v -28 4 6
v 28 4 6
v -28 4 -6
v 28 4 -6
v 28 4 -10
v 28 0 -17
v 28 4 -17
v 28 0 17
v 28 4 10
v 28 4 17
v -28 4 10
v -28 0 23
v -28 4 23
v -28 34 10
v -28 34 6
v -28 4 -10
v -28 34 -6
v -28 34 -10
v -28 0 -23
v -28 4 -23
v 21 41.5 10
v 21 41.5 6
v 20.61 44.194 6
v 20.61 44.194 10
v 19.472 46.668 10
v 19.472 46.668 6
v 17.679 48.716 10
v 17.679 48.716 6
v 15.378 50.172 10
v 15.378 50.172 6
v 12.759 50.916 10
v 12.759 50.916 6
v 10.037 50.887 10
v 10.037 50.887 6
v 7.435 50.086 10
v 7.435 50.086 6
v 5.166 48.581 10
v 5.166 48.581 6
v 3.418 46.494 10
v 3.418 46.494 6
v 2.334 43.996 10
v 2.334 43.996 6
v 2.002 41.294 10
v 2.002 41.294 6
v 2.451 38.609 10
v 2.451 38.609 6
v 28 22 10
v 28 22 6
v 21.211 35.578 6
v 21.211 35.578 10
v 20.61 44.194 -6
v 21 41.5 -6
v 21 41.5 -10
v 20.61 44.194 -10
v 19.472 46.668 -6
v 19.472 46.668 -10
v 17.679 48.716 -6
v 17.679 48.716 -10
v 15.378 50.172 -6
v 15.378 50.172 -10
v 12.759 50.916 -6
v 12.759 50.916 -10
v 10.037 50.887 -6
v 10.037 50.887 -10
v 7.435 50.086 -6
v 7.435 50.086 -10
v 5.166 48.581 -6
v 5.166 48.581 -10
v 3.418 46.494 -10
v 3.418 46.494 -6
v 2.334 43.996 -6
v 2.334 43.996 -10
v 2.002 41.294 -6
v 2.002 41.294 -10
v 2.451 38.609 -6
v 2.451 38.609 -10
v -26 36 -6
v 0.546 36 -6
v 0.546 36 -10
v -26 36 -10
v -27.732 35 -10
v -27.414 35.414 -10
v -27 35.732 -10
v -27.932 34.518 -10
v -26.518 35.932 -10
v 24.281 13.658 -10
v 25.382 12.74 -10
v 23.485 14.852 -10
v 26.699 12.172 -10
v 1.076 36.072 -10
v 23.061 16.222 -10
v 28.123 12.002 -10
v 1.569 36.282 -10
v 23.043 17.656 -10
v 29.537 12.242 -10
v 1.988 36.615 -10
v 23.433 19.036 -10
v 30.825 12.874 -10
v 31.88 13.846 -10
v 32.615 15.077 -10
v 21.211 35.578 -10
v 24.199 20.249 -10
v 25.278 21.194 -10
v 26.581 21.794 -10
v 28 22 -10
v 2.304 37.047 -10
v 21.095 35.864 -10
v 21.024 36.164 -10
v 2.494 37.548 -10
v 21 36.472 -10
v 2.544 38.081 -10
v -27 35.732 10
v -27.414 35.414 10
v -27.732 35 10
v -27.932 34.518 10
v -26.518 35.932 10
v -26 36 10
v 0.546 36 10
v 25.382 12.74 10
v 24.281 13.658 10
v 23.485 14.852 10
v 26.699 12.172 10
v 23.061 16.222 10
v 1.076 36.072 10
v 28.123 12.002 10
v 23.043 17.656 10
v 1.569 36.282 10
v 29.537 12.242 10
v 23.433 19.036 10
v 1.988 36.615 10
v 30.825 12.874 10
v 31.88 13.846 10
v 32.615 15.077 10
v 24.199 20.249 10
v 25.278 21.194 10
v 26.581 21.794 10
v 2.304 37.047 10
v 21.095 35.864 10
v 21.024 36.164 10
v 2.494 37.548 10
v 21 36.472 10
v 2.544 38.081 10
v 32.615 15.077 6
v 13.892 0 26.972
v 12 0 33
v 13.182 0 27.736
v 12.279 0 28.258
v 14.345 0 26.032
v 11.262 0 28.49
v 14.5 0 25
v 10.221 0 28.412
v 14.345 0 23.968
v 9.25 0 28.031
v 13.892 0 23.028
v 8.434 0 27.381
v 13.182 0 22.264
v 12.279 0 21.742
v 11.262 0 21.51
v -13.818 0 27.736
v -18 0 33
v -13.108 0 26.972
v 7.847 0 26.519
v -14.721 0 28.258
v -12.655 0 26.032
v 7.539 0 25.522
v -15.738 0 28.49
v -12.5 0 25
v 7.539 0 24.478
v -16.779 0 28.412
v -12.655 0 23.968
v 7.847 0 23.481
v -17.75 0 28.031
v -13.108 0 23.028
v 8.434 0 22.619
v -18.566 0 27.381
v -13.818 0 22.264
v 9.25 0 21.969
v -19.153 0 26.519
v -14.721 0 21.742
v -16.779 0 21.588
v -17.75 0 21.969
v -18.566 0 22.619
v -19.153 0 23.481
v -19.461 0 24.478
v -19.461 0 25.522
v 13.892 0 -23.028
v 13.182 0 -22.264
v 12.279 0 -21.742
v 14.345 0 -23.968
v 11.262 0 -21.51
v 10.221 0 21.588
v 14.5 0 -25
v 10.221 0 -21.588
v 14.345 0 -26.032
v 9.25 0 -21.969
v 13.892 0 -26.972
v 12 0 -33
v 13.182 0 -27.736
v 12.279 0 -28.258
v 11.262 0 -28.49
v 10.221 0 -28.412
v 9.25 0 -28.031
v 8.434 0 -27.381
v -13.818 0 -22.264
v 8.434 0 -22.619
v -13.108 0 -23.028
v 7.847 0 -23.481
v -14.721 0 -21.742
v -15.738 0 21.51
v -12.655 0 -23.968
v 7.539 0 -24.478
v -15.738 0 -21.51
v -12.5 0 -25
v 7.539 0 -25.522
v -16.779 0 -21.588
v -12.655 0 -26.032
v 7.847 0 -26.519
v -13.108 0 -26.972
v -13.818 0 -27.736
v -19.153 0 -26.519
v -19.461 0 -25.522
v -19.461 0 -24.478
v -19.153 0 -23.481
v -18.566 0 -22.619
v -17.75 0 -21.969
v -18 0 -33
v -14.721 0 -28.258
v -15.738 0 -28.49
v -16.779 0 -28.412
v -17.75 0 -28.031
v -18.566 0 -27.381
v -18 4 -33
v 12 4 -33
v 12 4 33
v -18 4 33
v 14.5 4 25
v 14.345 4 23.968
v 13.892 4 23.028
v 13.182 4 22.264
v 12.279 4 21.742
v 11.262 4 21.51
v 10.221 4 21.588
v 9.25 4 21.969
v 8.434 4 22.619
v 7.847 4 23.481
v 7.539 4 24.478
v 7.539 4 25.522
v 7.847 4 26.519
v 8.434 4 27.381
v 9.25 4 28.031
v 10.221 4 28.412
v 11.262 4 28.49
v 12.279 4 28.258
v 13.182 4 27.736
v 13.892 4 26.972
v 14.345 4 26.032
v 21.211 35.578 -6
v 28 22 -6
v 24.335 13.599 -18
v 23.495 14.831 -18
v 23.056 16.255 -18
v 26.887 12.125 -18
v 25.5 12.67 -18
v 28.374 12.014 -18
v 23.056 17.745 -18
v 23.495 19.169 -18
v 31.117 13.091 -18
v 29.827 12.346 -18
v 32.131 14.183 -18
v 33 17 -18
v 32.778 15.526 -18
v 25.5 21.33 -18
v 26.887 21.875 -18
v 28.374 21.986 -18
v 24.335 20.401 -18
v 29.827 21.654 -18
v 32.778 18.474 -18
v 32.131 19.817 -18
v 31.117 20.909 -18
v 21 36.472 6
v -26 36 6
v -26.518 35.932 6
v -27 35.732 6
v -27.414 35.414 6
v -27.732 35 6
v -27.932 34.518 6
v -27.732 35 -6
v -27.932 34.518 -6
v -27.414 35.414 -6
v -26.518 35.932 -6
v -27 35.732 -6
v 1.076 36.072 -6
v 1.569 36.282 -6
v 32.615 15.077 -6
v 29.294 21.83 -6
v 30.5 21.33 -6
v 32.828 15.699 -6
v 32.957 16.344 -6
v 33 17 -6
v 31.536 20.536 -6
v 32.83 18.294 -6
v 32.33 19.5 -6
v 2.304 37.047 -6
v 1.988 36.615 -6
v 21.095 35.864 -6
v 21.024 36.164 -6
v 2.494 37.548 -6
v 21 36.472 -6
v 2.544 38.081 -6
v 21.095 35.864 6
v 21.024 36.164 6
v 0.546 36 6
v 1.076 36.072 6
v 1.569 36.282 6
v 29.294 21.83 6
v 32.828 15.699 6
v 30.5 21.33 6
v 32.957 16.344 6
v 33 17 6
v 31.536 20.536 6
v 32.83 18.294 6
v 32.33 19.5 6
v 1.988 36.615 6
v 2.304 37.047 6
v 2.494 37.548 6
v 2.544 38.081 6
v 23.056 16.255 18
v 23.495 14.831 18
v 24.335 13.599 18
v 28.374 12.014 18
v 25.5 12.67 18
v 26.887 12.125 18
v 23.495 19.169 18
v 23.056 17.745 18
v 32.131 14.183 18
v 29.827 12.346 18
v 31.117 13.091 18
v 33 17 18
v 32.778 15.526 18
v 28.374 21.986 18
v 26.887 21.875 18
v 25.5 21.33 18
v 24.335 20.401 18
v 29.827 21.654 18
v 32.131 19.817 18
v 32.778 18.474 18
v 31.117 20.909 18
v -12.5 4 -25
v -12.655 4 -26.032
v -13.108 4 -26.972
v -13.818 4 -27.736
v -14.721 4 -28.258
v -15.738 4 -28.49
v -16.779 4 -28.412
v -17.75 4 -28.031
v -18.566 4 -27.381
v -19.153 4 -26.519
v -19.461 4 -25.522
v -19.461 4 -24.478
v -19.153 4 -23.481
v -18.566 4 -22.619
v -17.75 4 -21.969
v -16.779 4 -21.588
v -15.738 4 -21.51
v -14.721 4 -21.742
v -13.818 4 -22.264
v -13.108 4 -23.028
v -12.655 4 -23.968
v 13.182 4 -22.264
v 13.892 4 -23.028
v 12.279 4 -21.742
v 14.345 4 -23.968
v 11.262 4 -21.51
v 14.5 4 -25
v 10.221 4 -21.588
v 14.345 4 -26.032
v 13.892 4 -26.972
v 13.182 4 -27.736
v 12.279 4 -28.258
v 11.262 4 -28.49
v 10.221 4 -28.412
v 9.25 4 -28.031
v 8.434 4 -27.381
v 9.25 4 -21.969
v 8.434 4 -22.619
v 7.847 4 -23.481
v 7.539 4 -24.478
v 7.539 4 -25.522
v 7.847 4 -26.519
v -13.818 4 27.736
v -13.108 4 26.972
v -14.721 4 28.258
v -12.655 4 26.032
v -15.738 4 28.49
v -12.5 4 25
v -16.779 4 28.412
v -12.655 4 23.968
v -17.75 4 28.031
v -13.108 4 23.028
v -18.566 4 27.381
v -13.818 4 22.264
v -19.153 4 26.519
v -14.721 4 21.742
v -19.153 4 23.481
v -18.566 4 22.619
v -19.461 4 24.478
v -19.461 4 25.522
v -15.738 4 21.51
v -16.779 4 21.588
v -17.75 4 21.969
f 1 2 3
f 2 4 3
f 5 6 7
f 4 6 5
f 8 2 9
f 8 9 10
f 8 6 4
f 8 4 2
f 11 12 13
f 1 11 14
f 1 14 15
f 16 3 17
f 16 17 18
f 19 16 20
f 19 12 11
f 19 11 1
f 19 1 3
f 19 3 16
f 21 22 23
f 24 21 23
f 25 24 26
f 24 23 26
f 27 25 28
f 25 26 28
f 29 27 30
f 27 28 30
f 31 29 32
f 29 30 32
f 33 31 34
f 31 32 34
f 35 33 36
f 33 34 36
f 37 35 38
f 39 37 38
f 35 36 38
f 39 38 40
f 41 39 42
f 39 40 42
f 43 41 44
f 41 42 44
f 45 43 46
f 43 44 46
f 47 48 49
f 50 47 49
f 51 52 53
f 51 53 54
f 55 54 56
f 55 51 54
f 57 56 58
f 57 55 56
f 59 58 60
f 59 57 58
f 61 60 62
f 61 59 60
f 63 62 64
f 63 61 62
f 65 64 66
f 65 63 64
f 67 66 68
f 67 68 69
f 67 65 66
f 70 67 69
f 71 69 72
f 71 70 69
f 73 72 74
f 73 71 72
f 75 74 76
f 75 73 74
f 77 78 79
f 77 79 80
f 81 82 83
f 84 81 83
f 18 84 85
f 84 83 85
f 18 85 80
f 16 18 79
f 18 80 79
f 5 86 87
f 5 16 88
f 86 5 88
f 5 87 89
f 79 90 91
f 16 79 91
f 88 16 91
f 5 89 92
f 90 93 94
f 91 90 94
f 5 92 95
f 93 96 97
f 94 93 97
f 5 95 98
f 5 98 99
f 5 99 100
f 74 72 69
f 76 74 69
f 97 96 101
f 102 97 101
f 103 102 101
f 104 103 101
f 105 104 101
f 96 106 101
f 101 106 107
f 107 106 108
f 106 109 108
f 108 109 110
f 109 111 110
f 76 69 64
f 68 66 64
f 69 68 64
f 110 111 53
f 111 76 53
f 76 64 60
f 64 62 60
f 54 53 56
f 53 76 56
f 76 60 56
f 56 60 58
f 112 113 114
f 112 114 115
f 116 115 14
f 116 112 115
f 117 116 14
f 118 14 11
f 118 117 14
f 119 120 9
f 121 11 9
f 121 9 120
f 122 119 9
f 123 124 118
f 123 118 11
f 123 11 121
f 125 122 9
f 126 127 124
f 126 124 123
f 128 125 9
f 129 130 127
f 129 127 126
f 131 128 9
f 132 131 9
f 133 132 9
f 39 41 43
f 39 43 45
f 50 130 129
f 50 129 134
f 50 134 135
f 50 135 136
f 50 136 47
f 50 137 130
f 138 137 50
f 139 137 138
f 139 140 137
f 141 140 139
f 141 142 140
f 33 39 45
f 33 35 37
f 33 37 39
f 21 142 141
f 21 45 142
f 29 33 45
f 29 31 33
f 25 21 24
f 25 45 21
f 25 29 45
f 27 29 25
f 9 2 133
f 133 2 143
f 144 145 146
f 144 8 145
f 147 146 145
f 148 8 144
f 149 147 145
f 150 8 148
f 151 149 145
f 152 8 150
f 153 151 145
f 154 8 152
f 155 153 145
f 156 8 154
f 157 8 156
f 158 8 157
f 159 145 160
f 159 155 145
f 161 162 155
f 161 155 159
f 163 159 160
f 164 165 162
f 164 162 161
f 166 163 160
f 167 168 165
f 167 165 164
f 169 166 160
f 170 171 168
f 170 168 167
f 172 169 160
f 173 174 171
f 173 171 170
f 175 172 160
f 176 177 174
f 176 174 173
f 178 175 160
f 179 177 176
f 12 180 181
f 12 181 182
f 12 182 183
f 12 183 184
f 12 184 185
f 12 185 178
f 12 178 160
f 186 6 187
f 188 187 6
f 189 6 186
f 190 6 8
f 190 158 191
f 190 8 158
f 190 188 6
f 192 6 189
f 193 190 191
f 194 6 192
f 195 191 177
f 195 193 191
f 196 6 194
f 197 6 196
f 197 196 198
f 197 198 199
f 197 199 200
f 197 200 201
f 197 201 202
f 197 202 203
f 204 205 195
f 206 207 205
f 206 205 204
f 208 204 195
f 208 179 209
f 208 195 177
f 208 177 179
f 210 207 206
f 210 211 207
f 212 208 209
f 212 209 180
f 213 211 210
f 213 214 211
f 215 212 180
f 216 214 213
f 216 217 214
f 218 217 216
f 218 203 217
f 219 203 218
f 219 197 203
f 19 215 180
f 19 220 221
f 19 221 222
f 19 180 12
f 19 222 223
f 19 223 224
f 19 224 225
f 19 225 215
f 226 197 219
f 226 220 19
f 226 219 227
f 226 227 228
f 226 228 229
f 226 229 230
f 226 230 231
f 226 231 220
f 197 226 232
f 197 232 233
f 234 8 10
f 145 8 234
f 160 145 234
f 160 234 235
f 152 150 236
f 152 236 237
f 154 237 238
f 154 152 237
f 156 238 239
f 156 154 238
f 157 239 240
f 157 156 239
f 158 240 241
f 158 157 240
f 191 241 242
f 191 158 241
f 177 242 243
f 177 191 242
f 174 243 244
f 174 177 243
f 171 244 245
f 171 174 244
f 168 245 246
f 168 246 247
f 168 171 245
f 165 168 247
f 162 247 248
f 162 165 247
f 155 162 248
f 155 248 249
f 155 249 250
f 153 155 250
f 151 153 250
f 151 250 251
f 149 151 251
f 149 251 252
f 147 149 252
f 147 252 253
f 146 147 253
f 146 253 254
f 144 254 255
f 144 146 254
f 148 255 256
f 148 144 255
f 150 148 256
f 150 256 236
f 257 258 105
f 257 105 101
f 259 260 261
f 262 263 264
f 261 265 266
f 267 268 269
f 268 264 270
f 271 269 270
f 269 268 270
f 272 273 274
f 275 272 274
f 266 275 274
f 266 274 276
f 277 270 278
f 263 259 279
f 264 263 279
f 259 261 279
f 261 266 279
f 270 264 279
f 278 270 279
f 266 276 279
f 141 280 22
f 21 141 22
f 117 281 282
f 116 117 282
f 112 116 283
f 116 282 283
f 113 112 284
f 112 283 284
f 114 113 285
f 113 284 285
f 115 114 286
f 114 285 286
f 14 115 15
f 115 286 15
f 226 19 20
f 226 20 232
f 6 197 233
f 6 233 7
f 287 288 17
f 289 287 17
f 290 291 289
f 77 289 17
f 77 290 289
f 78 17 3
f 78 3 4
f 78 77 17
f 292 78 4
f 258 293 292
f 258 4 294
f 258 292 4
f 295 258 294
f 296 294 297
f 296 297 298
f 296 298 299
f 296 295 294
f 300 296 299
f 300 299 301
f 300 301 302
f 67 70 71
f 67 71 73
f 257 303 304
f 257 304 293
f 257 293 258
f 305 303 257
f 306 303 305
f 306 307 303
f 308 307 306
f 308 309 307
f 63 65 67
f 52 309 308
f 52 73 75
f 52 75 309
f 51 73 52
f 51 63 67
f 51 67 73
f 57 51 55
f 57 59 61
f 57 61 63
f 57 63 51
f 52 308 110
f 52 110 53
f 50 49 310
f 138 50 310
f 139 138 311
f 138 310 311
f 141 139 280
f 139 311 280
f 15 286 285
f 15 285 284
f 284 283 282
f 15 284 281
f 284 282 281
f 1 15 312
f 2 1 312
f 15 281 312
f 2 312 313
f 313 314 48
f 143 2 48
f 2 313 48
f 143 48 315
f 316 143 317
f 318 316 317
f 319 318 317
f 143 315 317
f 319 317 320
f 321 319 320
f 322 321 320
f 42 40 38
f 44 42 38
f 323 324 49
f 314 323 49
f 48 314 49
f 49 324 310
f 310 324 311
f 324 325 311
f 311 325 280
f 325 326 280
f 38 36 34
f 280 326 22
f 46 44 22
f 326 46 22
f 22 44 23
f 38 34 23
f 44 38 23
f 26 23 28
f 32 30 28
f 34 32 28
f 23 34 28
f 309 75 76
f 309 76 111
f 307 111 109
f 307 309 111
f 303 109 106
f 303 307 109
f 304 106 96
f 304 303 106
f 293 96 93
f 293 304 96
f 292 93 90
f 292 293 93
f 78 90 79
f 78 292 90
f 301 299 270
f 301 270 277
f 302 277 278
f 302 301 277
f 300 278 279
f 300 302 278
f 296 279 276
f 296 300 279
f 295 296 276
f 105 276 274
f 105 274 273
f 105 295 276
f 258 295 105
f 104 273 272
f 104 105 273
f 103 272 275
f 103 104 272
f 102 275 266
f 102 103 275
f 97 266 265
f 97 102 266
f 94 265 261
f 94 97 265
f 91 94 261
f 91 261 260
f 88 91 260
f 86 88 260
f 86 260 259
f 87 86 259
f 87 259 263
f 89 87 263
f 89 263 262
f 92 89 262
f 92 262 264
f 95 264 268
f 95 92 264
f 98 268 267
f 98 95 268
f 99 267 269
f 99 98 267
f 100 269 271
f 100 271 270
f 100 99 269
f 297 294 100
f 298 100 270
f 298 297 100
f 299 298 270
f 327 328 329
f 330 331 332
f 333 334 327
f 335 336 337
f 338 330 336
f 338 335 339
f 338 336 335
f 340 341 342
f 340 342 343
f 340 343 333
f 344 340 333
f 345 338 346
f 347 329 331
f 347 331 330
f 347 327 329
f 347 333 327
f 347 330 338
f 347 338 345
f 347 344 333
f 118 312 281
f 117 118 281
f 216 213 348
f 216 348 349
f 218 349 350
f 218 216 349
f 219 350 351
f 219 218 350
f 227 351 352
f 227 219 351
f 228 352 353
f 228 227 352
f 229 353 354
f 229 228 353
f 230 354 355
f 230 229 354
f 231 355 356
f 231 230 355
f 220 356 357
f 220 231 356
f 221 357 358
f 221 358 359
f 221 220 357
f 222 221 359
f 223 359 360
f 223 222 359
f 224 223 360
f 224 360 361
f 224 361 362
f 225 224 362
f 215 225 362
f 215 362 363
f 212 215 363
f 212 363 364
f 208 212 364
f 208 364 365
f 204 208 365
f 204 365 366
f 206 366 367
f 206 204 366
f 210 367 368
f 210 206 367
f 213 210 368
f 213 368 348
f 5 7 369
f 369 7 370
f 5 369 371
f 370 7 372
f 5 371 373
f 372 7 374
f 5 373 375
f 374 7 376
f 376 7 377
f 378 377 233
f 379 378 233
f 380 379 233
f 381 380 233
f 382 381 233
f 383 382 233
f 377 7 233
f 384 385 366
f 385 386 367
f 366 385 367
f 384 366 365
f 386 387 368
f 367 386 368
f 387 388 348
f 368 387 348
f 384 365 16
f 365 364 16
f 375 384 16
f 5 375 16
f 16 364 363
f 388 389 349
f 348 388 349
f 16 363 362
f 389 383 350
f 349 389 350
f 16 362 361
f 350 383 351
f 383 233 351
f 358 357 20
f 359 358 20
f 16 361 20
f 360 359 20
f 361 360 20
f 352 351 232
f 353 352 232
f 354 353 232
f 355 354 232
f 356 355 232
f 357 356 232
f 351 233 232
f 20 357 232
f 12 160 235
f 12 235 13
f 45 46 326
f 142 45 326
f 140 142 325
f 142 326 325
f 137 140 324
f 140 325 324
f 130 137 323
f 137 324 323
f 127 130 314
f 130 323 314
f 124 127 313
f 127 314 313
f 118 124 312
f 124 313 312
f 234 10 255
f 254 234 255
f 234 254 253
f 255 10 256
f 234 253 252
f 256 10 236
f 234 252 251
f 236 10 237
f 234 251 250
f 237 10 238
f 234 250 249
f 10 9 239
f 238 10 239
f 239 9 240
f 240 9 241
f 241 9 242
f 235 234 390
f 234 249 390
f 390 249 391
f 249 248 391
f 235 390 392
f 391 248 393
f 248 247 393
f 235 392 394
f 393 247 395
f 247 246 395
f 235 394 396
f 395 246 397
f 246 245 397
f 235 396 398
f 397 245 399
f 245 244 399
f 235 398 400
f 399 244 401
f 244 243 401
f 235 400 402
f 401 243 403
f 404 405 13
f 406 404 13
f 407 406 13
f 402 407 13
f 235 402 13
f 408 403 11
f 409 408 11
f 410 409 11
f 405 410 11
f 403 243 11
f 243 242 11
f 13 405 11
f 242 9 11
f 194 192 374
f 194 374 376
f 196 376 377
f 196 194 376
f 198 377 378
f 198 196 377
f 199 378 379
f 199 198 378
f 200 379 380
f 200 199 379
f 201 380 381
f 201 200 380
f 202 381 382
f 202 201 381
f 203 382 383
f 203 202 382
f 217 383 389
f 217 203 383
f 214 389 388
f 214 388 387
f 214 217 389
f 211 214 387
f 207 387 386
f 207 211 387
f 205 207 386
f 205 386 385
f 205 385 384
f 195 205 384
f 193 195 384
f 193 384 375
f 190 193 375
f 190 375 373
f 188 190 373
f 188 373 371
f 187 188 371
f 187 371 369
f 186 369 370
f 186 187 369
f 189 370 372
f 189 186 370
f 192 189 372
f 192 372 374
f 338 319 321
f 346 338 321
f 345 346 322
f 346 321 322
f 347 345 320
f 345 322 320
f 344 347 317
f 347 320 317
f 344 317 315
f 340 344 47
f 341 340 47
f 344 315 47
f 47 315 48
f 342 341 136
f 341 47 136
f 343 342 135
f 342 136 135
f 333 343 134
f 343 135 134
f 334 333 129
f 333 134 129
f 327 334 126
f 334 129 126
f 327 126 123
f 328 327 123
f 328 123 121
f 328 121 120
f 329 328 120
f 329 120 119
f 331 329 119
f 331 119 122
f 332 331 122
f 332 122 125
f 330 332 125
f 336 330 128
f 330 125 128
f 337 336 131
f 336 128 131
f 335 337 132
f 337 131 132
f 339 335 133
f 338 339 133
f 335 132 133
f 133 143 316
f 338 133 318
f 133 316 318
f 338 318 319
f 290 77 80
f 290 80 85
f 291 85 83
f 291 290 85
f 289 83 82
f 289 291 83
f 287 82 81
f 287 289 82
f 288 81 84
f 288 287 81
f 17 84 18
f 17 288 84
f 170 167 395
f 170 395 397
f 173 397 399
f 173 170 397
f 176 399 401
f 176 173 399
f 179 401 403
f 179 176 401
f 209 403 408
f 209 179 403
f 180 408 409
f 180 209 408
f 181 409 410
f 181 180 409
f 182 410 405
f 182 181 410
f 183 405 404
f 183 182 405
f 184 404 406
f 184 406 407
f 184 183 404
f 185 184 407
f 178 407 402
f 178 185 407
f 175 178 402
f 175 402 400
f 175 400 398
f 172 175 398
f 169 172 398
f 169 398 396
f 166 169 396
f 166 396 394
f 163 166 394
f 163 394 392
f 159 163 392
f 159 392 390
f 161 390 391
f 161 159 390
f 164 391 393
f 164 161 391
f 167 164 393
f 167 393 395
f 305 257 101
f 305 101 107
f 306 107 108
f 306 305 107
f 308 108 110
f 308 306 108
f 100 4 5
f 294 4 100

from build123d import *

# Parameters (mm, degrees)
SKETCH1_R           = 3.5
BOSS_EXTRUDE1_DEPTH = 4
BOSS_EXTRUDE2_DEPTH = 4
SKETCH6_R           = 5
BOSS_EXTRUDE3_DEPTH = 12


with BuildPart() as part:
    # Sketch1 → Boss-Extrude1 (new body)
    with BuildSketch(Plane(origin=(0, 0, 0), x_dir=(1, 0, 0), z_dir=(0, 1, 0))):
        Polygon((-28, 23), (-18, 33), (12, 33), (28, 17), (28, -17), (12, -33), (-18, -33), (-28, -23), align=None)
        with Locations((11, 25)):
            Circle(SKETCH1_R, mode=Mode.SUBTRACT)
        with Locations((11, -25)):
            Circle(SKETCH1_R, mode=Mode.SUBTRACT)
        with Locations((-16, -25)):
            Circle(SKETCH1_R, mode=Mode.SUBTRACT)
        with Locations((-16, 25)):
            Circle(SKETCH1_R, mode=Mode.SUBTRACT)
    extrude(amount=BOSS_EXTRUDE1_DEPTH)

    # Sketch2 → Boss-Extrude2 (add)
    with BuildSketch(Plane.XY.offset(6)):
        with BuildLine():
            Line((-28, 34), (-28, 4))
            Line((-28, 4), (28, 4))
            Line((28, 4), (32.615384615, 15.076923077))
            ThreePointArc((32.615384615, 15.076923077), (23.839748528, 14.226499019), (28, 22))
            Line((28, 22), (21.211145618, 35.577708764))
            ThreePointArc((21.211145618, 35.577708764), (21.053502021, 36.012630114), (21, 36.472135955))
            Line((21, 36.472135955), (21, 41.5))
            ThreePointArc((21, 41.5), (10.03689158, 50.886656154), (2.450670789, 38.608695652))
            ThreePointArc((2.450670789, 38.608695652), (2.160694556, 36.820464351), (0.54554885, 36))
            Line((0.54554885, 36), (-26, 36))
            ThreePointArc((-26, 36), (-27.414213562, 35.414213562), (-28, 34))
        make_face()
    boss_extrude2 = extrude(amount=BOSS_EXTRUDE2_DEPTH)

    # Sketch6 → Boss-Extrude3 (add)
    with BuildSketch(Plane.XY.offset(6)):
        with Locations((28, 17)):
            Circle(SKETCH6_R)
    boss_extrude3 = extrude(amount=BOSS_EXTRUDE3_DEPTH)

    # Mirror1: Boss-Extrude2 across plane
    add(boss_extrude2.mirror(Plane.XY))

    # Mirror2: Boss-Extrude3 across plane
    add(boss_extrude3.mirror(Plane.XY))


solid = part.part
